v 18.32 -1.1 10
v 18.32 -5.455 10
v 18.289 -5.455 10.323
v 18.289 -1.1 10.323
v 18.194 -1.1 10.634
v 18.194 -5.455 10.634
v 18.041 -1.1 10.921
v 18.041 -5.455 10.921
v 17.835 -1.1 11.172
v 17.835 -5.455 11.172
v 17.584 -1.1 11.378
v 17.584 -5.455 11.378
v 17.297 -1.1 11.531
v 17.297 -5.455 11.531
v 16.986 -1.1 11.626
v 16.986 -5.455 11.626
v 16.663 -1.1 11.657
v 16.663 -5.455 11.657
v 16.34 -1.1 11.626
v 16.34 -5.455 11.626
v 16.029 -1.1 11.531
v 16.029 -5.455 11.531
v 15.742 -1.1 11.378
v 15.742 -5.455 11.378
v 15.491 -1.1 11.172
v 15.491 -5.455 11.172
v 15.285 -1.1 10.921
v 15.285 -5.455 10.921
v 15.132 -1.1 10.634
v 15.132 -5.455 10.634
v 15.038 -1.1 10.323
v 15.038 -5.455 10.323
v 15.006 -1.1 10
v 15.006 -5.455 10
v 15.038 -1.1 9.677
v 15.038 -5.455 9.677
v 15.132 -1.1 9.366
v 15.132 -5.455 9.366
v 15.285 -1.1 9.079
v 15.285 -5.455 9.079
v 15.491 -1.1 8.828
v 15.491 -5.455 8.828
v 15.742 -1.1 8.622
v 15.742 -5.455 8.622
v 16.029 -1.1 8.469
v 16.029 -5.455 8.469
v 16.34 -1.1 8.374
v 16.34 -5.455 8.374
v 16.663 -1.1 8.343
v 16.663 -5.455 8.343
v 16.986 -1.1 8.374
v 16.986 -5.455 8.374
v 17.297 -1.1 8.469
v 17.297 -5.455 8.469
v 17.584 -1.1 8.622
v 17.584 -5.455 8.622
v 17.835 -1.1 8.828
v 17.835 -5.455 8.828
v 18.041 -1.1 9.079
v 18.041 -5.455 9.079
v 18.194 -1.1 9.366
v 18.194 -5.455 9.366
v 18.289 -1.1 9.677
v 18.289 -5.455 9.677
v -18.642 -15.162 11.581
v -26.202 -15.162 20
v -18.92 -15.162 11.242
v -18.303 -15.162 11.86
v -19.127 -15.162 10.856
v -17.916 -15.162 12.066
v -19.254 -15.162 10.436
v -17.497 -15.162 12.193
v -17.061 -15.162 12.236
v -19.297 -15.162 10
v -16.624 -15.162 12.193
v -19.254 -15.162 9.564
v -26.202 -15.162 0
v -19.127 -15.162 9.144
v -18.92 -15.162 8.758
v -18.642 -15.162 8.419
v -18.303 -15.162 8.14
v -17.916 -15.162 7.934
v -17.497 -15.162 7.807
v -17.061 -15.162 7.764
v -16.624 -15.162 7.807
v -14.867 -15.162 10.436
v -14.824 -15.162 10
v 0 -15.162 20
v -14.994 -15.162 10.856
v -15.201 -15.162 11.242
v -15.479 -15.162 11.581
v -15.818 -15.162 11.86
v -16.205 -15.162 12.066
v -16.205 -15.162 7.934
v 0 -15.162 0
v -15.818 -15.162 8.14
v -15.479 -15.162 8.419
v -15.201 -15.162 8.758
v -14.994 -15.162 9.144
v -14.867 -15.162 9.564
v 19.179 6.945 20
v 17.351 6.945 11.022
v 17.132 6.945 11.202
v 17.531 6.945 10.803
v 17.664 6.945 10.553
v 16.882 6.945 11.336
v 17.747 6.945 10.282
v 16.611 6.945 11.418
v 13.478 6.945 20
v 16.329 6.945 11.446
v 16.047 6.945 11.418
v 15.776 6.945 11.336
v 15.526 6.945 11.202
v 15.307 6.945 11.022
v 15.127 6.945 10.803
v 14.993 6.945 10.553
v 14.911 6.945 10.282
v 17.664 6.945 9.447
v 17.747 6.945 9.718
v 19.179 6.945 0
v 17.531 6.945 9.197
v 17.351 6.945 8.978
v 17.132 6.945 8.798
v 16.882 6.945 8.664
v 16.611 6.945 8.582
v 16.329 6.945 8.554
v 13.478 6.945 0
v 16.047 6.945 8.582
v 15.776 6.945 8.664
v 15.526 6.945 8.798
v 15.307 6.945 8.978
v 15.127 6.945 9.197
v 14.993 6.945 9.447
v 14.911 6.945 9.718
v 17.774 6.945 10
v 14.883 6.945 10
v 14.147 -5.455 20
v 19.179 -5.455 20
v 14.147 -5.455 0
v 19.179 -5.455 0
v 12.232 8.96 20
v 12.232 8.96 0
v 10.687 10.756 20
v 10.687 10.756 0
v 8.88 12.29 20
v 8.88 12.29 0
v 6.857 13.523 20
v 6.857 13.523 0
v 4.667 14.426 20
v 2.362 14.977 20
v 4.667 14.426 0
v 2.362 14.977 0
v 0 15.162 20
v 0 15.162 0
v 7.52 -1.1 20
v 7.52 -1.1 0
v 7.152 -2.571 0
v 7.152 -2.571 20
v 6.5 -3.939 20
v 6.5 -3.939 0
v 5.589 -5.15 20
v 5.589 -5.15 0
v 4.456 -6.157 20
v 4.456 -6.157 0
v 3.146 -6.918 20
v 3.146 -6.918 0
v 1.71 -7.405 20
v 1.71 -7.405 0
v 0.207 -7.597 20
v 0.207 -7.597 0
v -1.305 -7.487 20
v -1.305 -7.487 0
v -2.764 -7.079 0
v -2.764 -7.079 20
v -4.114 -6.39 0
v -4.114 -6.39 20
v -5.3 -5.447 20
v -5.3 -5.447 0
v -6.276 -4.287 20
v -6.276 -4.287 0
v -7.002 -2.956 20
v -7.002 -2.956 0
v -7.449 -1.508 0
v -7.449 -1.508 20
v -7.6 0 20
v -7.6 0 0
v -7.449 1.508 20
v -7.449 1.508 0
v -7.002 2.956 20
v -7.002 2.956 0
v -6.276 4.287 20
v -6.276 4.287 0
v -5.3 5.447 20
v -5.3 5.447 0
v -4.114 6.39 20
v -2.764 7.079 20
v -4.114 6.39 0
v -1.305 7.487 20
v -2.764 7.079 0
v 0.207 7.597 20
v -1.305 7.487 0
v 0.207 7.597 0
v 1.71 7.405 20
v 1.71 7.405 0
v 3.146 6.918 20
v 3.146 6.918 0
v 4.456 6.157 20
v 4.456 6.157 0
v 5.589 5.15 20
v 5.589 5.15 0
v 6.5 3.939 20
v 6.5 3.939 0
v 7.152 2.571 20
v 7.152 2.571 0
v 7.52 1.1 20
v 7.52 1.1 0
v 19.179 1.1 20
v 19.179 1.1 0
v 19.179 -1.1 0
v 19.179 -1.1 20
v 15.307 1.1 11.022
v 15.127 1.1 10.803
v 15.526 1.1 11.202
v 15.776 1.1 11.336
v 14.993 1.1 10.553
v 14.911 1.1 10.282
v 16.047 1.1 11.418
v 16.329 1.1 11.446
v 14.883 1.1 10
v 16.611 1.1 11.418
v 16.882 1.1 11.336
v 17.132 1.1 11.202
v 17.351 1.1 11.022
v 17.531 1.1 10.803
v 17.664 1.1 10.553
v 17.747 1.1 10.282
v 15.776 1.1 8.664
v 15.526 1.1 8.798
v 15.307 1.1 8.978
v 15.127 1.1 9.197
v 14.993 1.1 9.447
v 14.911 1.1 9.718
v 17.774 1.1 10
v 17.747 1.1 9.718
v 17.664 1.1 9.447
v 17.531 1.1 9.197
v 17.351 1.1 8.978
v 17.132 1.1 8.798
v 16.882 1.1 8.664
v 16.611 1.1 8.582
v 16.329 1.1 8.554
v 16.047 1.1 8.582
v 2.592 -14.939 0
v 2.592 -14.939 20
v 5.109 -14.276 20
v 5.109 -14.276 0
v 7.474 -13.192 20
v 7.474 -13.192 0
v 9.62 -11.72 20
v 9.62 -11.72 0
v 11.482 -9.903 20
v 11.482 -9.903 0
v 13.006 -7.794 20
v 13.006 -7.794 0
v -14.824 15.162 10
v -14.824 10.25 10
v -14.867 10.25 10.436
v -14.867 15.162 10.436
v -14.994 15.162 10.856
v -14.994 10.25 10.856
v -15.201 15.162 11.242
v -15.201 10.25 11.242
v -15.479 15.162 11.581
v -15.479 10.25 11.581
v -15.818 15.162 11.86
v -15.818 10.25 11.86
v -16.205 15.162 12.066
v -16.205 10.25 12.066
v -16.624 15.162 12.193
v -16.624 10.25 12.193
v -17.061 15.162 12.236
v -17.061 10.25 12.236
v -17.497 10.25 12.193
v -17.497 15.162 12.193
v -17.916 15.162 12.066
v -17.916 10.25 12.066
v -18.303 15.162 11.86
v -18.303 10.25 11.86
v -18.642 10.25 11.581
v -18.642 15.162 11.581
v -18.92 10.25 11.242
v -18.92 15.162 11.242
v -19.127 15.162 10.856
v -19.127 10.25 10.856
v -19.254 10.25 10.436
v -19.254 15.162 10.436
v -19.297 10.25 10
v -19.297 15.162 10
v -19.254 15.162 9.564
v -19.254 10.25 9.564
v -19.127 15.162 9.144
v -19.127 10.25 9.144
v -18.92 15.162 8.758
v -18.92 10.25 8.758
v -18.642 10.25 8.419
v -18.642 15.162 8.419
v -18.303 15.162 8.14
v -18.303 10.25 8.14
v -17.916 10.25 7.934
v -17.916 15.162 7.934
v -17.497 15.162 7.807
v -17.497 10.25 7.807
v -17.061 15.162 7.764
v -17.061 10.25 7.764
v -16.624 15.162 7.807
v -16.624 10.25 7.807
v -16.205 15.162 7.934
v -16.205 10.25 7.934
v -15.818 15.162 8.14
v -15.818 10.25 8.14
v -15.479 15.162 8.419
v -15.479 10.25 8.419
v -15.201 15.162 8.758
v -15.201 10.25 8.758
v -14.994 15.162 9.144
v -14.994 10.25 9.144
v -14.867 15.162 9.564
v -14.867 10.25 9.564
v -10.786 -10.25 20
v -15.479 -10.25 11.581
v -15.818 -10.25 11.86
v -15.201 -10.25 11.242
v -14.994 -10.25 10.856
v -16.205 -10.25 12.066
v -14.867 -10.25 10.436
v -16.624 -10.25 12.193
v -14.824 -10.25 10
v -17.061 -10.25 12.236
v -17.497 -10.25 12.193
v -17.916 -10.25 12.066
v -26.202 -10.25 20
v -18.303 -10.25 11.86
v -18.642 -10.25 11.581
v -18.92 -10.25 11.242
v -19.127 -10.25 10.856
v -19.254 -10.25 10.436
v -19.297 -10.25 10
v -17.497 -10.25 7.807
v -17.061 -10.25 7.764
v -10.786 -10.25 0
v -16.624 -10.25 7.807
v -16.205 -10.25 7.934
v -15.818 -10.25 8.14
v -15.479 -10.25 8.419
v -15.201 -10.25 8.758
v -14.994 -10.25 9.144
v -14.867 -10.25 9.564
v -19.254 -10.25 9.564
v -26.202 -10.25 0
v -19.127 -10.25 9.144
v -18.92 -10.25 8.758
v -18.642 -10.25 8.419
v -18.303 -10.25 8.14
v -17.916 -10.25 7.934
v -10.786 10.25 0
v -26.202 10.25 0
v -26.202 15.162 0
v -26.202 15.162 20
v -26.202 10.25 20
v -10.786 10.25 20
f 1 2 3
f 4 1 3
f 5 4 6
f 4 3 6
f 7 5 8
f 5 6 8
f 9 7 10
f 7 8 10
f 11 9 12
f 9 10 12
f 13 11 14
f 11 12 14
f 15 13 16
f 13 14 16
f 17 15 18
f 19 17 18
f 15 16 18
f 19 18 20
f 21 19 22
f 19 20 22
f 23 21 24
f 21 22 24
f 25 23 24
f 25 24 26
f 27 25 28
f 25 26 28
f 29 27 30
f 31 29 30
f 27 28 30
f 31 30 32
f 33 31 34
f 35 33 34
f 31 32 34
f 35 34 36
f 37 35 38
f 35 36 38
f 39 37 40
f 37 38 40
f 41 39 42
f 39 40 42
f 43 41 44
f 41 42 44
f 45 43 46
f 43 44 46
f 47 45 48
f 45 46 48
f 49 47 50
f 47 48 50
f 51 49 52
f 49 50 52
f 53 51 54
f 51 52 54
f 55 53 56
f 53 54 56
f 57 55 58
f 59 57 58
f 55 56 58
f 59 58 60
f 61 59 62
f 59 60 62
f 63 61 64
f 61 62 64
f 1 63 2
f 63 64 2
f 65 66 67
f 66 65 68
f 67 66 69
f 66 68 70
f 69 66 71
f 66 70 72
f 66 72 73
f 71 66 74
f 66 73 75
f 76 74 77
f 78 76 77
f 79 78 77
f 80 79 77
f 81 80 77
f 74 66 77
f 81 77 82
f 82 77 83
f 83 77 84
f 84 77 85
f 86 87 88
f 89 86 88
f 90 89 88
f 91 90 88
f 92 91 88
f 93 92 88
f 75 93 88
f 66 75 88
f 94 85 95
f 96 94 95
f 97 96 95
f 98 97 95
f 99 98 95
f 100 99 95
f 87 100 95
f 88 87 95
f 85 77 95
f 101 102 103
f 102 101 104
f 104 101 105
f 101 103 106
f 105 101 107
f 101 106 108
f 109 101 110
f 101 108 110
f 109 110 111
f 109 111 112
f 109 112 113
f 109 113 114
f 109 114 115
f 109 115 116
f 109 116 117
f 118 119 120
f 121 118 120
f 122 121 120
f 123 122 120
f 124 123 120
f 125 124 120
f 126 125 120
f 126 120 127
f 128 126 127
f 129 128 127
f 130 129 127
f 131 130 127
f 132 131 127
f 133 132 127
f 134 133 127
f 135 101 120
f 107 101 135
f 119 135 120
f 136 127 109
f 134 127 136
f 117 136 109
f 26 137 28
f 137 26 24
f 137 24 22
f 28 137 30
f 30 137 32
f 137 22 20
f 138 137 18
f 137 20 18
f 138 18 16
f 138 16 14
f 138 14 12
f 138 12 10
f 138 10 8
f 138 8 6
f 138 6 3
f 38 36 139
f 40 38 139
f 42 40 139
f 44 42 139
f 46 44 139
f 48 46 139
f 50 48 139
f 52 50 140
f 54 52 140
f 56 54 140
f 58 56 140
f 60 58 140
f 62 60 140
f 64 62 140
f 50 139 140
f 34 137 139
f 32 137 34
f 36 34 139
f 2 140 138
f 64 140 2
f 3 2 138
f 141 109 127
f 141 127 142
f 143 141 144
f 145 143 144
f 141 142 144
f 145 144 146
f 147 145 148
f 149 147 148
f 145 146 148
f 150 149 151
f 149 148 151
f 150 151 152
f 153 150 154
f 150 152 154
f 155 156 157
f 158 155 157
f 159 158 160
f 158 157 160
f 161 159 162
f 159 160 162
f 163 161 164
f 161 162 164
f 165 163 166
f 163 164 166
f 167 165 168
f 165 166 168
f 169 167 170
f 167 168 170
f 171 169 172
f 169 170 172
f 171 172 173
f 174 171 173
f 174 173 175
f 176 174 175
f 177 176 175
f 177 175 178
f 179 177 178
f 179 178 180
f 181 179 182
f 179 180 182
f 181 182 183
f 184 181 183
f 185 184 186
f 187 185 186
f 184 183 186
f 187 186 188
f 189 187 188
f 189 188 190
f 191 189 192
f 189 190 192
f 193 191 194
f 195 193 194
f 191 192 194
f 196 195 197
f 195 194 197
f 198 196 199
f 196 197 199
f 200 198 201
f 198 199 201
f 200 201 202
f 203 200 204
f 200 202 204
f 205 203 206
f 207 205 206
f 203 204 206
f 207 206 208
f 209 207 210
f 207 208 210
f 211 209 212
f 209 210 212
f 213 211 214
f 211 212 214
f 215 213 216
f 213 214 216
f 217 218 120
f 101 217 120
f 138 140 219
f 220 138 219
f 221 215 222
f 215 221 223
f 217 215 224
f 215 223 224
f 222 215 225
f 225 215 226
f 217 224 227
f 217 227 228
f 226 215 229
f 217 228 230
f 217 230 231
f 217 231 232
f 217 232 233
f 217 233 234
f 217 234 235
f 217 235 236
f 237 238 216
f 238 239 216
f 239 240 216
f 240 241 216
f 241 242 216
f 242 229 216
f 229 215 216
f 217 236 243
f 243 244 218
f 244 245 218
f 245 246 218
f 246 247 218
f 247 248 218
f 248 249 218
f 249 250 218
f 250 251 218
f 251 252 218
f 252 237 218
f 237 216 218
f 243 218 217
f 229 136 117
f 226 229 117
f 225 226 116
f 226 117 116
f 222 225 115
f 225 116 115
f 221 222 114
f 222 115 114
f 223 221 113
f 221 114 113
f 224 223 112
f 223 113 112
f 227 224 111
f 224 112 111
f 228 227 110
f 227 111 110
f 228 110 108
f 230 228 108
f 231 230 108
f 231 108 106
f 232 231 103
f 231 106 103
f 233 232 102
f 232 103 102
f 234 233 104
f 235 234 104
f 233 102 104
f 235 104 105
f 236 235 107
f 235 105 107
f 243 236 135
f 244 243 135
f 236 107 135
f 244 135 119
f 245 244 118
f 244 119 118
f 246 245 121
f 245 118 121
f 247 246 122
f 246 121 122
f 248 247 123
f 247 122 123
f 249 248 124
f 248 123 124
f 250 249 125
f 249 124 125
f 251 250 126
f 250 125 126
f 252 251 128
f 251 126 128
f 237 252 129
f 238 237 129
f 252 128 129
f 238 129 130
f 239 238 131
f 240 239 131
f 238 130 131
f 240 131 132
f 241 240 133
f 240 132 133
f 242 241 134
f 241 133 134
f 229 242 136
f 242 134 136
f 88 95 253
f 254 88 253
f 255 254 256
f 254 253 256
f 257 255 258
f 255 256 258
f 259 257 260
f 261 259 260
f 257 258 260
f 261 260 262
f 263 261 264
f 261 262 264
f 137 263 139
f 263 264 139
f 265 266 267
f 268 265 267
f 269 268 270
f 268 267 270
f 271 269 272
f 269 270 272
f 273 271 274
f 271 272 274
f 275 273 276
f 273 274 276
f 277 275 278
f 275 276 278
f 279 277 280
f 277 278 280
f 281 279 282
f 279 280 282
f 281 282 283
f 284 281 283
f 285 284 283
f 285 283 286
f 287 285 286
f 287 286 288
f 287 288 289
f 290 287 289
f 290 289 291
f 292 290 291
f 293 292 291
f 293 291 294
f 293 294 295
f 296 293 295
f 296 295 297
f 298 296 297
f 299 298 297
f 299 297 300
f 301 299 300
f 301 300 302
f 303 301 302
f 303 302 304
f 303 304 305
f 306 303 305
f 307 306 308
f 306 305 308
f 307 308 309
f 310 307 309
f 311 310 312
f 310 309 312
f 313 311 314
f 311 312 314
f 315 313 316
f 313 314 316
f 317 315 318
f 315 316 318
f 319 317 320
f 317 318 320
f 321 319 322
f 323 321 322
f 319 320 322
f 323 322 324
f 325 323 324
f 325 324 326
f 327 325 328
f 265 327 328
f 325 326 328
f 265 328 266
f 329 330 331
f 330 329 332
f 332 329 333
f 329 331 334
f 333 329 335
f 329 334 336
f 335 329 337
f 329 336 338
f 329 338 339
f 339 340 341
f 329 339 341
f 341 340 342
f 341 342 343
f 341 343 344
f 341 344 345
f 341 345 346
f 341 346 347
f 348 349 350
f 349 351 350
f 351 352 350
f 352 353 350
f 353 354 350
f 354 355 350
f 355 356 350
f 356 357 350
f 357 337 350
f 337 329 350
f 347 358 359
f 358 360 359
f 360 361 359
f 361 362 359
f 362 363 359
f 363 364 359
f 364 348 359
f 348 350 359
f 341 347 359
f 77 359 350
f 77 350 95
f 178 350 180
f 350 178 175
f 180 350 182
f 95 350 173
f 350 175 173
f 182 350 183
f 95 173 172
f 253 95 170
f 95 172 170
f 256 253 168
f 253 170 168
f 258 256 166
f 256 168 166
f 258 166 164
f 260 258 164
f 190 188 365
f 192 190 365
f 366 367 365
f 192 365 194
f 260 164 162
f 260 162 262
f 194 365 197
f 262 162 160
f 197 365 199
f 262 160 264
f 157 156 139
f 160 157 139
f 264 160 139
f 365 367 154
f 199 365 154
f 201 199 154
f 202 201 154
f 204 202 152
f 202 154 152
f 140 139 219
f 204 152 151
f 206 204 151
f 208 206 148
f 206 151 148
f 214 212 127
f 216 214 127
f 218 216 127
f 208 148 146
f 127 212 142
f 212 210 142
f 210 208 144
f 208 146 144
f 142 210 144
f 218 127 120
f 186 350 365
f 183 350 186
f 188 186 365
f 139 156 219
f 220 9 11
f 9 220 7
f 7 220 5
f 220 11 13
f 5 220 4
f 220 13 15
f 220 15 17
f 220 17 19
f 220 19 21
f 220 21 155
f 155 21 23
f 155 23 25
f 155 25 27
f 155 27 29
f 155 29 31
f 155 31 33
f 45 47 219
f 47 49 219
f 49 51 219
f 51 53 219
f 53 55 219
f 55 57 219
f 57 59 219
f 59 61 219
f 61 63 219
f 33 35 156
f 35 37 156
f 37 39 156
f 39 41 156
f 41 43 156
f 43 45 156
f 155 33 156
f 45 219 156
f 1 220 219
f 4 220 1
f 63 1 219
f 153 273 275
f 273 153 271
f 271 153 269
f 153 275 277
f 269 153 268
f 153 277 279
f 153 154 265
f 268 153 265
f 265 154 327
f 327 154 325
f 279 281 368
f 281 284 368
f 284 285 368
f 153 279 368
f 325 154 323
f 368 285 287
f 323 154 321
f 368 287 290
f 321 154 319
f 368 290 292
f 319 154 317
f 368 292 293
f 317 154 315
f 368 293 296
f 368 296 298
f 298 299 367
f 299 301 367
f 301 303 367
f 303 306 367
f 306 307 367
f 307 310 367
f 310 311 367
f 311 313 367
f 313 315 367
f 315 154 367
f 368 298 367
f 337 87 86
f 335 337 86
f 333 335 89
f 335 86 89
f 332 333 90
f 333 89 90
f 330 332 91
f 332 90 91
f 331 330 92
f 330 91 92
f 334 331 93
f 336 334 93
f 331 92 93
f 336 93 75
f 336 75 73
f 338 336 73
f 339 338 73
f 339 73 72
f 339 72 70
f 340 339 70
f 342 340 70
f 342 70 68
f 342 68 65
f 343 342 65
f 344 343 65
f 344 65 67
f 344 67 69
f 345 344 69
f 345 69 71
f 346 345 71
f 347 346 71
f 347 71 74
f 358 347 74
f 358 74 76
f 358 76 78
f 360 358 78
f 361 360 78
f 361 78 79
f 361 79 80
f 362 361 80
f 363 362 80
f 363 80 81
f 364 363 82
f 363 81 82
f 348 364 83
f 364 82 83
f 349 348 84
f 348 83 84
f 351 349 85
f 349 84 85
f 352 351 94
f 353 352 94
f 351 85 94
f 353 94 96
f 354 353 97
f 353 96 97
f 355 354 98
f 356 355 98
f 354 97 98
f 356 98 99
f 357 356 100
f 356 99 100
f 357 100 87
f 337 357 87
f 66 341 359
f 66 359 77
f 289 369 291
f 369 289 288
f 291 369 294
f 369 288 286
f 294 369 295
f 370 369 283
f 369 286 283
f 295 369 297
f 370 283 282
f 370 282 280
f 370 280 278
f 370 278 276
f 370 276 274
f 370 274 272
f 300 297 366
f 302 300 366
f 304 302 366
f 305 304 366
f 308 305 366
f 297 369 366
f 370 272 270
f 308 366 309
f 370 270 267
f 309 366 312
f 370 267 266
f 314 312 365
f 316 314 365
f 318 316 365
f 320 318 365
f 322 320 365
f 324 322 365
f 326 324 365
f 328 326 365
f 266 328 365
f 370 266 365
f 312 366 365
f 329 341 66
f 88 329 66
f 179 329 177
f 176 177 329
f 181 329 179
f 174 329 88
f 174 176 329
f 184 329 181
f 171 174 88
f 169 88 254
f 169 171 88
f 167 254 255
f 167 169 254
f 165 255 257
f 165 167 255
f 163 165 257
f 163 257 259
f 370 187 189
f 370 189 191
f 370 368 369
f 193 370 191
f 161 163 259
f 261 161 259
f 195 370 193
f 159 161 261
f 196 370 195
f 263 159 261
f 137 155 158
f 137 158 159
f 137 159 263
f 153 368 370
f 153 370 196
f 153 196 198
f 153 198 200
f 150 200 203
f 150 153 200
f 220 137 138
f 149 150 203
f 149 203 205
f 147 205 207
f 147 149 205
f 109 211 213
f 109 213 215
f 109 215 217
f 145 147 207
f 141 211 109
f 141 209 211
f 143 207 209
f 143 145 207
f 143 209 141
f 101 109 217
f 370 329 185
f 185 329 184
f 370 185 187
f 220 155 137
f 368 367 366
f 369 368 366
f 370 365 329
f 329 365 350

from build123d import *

# Parameters (mm, degrees)
F1_DEPTH = 20
F2_R     = 1.657373
F3_DEPTH = 4.354743
F4_R     = 1.445676
F5_DEPTH = 5.844262
F6_R     = 2.236419
F7_DEPTH = 30.325829


with BuildPart() as f1:
    # F0 (on Top) → F1 (new body)
    with BuildSketch(Plane.XY):
        with BuildLine():
            ThreePointArc((7.519909, -1.100443), (-7.6, 0), (7.519909, 1.100443))
            Line((7.519909, 1.100443), (19.17907, 1.100443))
            Line((19.17907, 1.100443), (19.17907, 6.944705))
            Line((19.17907, 6.944705), (13.478497, 6.944705))
            ThreePointArc((13.478497, 6.944705), (7.893045, 12.94599), (0, 15.162414))
            Line((0, 15.162414), (-26.202165, 15.162414))
            Line((-26.202165, 15.162414), (-26.202165, 10.25))
            Line((-26.202165, 10.25), (-10.786354, 10.25))
            Line((-10.786354, 10.25), (-10.786354, -10.25))
            Line((-10.786354, -10.25), (-26.202165, -10.25))
            Line((-26.202165, -10.25), (-26.202165, -15.162414))
            Line((-26.202165, -15.162414), (0, -15.162414))
            ThreePointArc((0, -15.162414), (8.578608, -12.502252), (14.147076, -5.455186))
            Line((14.147076, -5.455186), (19.17907, -5.455186))
            Line((19.17907, -5.455186), (19.17907, -1.100443))
            Line((19.17907, -1.100443), (7.519909, -1.100443))
        make_face()
    extrude(amount=F1_DEPTH)

    # F2 (on face) → F3 (cut, through all)
    with BuildSketch(Plane.XZ.offset(5.455186)):
        with Locations((16.663073, 10)):
            Circle(F2_R)
    extrude(amount=-F3_DEPTH, mode=Mode.SUBTRACT)

    # F4 (on face) → F5 (cut, through all)
    with BuildSketch(Plane(origin=(0, 6.944705, 0), x_dir=(-1, 0, 0), z_dir=(0, 1, 0))):
        with Locations((-16.328784, 10)):
            Circle(F4_R)
    extrude(amount=-F5_DEPTH, mode=Mode.SUBTRACT)

    # F6 (on face) → F7 (cut, through all)
    with BuildSketch(Plane.XZ.offset(15.162414)):
        with Locations((-17.060504, 10)):
            Circle(F6_R)
    extrude(amount=-F7_DEPTH, mode=Mode.SUBTRACT)


solid = f1.part
